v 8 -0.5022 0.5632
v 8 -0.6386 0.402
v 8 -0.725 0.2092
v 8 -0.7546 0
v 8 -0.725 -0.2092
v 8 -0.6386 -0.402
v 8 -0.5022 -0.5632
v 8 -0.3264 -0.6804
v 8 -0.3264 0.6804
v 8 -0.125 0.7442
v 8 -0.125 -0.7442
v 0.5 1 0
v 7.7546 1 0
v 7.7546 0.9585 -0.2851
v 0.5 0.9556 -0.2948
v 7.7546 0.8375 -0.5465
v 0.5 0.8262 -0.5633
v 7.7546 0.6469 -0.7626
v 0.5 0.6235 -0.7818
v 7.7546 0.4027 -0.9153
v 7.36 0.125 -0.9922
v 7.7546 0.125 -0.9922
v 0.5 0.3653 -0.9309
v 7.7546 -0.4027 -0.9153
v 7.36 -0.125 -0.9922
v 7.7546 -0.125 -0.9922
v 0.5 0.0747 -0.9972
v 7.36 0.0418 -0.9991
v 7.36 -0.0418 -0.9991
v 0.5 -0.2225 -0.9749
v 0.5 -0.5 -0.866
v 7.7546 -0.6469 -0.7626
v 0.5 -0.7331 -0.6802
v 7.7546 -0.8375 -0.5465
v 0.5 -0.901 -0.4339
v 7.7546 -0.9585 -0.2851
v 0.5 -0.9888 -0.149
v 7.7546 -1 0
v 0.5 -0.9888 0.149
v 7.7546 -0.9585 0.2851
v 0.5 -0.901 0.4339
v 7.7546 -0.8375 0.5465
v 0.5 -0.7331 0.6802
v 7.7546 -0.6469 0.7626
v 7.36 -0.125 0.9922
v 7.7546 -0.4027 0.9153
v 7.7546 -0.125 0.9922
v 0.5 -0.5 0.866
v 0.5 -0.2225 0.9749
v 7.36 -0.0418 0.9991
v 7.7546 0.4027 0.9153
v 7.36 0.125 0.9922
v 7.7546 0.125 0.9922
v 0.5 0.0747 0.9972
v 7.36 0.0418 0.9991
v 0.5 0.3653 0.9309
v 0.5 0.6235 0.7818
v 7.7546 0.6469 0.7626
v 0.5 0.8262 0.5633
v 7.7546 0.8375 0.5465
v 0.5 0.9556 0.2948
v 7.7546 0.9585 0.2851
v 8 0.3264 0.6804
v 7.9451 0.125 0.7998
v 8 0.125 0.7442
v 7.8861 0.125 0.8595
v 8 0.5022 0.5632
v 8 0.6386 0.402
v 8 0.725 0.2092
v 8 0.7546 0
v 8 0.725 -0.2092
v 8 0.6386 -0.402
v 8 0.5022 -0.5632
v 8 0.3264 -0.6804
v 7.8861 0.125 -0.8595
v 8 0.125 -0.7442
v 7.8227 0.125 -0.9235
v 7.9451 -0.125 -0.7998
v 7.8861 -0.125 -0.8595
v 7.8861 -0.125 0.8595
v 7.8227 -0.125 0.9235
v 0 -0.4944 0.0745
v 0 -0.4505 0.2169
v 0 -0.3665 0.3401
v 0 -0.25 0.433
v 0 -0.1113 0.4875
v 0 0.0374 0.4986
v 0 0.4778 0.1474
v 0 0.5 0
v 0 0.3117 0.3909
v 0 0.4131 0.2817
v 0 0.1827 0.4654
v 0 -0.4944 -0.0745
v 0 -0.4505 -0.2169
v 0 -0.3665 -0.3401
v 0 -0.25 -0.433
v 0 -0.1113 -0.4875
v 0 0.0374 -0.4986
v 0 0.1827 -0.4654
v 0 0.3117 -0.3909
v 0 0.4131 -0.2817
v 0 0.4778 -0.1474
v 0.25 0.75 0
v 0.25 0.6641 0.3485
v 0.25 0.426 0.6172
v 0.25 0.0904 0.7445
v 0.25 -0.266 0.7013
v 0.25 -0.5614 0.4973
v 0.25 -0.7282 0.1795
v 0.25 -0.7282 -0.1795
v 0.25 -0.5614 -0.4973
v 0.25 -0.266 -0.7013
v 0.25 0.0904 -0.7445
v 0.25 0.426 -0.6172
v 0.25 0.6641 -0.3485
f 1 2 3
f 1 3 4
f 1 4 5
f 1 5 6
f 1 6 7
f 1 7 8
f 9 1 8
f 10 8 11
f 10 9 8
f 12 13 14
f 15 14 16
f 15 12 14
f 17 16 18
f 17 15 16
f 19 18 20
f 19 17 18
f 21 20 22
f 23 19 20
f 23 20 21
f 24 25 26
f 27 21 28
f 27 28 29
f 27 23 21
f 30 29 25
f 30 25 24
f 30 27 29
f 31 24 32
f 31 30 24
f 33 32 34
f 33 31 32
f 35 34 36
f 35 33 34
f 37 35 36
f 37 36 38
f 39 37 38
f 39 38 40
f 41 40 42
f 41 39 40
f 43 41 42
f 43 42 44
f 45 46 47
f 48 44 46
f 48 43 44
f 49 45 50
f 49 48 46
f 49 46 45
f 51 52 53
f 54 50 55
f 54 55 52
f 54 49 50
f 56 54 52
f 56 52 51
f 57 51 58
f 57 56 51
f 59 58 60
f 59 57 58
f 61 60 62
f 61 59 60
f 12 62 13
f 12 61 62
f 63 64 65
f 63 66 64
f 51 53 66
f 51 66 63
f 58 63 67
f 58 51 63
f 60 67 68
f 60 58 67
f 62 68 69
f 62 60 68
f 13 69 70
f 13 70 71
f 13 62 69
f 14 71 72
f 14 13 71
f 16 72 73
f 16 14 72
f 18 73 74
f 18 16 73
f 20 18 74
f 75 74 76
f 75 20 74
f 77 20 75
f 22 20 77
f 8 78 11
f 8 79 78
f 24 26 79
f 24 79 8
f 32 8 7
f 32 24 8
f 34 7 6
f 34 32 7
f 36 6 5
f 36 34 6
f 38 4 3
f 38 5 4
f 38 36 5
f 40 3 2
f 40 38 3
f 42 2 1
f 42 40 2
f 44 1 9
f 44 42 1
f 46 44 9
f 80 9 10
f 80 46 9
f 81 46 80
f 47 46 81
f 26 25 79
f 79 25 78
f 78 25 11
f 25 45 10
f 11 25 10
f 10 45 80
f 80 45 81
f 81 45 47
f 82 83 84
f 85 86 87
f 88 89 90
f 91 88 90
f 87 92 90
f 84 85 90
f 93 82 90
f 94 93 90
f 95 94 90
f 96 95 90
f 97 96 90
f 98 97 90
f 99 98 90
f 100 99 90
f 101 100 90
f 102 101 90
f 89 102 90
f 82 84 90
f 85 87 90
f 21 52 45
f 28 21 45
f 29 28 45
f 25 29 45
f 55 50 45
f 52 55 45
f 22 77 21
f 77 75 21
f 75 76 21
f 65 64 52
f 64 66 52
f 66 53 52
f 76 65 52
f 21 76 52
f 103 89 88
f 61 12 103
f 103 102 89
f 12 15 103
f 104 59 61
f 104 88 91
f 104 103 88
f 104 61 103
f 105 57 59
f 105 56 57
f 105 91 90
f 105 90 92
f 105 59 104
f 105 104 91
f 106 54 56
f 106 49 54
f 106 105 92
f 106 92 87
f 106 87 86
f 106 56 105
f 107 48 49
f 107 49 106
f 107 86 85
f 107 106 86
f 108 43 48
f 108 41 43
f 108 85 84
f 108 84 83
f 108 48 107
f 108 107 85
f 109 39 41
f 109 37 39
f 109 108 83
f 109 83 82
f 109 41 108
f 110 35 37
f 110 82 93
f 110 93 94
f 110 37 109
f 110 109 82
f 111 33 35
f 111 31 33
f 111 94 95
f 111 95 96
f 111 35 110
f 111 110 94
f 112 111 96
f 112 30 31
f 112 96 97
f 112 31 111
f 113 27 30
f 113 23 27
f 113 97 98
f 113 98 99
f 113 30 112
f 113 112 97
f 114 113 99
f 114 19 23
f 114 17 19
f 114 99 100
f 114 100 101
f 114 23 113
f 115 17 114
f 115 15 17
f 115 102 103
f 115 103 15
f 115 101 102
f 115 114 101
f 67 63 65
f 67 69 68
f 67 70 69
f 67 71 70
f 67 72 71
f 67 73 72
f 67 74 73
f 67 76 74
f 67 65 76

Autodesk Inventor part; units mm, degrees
ref_plane "YZ Plane" through (0, 0, 0) normal (1, 0, 0) x (0, 1, 0)
ref_plane "XZ Plane" through (0, 0, 0) normal (0, 1, 0) x (-1, 0, 0)
sketch "Sketch1" plane through (0, 0, 0) normal (0, 0, 1) x (1, 0, 0)
  line L0 (0, 0) -> (8, 0)
  line L1 (8, 0) -> (8, 1)
  line L2 (8, 1) -> (0, 1)
  line L3 (0, -0.2) -> (0, 1.2) projected
  line L4 (0, 1) -> (0, 0)
  dimension "d0" = 2
  dimension "d2" = 8
revolve "Body" add sketch "Sketch1" angle 360 about axis through (0, 0, 0) along (1, 0, 0)
chamfer "Chamfer1" distance 0.2454 angle 45 1 edges at (8, -1, 0) measured on face at (8, 0.3808, -0.3117)
sketch "Sketch2" plane through (0, 0, 0) normal (0, 0, 1) x (1, 0, 0)
  line L0 (8, 0.7546) -> (8, -0.7546) projected
  line L1 (7.232, 0) -> (8.128, 0) projected
  line L2 (8, 0.125) -> (7.36, 0.125)
  line L3 (7.36, 0.125) -> (7.36, 0)
  line L4 (7.36, -0.125) -> (7.36, 0)
  line L5 (7.36, -0.125) -> (8, -0.125)
  dimension "d8" = 0.125
  dimension "d9" = 0.64
extrude "Slot1" cut sketch "Sketch2" against normal mid plane 2
thread "Thread" size "M2x0.4" class "6g" standard "ISO Metric profile" length 8
chamfer "Chamfer2" distance 0.5 angle 45 1 edges at (0, -1, 0) measured on face at (2.5849, -0.4298, 0.9029)
ref_plane "Work Plane1" through (4, 0, 0) normal (0, 0, 1) x (1, 0, 0)
equation "\"d8\" = 0.5 * SBR"
equation "\"d9\" = STI"
equation "\"d10\" = NND"
equation "\"d3\" = -0.5 * GD1 + 0.5 * NND"
equation "\"d4\" = FAWI"
equation "\"d34\" = -0.5 * GD1 + 0.5 * NND"
equation "\"d5\" = NLG"
equation "\"d14\" = FAWI"
equation "\"d0\" = NND"
equation "\"d2\" = NLG"
equation "\"NND\" = 2"
equation "\"NLG\" = 8"
equation "\"FAWI\" = 45deg"
equation "\"GD1\" = THREADDIA - 1.2269 * PTC"
equation "\"FAWI1\" = 45deg"
equation "\"SPD\" = 1"
equation "\"SBR\" = 0.25"
equation "\"STI\" = 0.64"
equation "\"GUL\" = 0.61345 * PTC"
equation "\"THREADDIA\" = 2"
equation "\"TOA\" = 30deg"
equation "\"PTC\" = 0.4"
equation "\"GAL\" = 0.61345 * PTC"
properties part number "ISO 4766 - M2 x 8" material "Stainless Steel, 440C"
